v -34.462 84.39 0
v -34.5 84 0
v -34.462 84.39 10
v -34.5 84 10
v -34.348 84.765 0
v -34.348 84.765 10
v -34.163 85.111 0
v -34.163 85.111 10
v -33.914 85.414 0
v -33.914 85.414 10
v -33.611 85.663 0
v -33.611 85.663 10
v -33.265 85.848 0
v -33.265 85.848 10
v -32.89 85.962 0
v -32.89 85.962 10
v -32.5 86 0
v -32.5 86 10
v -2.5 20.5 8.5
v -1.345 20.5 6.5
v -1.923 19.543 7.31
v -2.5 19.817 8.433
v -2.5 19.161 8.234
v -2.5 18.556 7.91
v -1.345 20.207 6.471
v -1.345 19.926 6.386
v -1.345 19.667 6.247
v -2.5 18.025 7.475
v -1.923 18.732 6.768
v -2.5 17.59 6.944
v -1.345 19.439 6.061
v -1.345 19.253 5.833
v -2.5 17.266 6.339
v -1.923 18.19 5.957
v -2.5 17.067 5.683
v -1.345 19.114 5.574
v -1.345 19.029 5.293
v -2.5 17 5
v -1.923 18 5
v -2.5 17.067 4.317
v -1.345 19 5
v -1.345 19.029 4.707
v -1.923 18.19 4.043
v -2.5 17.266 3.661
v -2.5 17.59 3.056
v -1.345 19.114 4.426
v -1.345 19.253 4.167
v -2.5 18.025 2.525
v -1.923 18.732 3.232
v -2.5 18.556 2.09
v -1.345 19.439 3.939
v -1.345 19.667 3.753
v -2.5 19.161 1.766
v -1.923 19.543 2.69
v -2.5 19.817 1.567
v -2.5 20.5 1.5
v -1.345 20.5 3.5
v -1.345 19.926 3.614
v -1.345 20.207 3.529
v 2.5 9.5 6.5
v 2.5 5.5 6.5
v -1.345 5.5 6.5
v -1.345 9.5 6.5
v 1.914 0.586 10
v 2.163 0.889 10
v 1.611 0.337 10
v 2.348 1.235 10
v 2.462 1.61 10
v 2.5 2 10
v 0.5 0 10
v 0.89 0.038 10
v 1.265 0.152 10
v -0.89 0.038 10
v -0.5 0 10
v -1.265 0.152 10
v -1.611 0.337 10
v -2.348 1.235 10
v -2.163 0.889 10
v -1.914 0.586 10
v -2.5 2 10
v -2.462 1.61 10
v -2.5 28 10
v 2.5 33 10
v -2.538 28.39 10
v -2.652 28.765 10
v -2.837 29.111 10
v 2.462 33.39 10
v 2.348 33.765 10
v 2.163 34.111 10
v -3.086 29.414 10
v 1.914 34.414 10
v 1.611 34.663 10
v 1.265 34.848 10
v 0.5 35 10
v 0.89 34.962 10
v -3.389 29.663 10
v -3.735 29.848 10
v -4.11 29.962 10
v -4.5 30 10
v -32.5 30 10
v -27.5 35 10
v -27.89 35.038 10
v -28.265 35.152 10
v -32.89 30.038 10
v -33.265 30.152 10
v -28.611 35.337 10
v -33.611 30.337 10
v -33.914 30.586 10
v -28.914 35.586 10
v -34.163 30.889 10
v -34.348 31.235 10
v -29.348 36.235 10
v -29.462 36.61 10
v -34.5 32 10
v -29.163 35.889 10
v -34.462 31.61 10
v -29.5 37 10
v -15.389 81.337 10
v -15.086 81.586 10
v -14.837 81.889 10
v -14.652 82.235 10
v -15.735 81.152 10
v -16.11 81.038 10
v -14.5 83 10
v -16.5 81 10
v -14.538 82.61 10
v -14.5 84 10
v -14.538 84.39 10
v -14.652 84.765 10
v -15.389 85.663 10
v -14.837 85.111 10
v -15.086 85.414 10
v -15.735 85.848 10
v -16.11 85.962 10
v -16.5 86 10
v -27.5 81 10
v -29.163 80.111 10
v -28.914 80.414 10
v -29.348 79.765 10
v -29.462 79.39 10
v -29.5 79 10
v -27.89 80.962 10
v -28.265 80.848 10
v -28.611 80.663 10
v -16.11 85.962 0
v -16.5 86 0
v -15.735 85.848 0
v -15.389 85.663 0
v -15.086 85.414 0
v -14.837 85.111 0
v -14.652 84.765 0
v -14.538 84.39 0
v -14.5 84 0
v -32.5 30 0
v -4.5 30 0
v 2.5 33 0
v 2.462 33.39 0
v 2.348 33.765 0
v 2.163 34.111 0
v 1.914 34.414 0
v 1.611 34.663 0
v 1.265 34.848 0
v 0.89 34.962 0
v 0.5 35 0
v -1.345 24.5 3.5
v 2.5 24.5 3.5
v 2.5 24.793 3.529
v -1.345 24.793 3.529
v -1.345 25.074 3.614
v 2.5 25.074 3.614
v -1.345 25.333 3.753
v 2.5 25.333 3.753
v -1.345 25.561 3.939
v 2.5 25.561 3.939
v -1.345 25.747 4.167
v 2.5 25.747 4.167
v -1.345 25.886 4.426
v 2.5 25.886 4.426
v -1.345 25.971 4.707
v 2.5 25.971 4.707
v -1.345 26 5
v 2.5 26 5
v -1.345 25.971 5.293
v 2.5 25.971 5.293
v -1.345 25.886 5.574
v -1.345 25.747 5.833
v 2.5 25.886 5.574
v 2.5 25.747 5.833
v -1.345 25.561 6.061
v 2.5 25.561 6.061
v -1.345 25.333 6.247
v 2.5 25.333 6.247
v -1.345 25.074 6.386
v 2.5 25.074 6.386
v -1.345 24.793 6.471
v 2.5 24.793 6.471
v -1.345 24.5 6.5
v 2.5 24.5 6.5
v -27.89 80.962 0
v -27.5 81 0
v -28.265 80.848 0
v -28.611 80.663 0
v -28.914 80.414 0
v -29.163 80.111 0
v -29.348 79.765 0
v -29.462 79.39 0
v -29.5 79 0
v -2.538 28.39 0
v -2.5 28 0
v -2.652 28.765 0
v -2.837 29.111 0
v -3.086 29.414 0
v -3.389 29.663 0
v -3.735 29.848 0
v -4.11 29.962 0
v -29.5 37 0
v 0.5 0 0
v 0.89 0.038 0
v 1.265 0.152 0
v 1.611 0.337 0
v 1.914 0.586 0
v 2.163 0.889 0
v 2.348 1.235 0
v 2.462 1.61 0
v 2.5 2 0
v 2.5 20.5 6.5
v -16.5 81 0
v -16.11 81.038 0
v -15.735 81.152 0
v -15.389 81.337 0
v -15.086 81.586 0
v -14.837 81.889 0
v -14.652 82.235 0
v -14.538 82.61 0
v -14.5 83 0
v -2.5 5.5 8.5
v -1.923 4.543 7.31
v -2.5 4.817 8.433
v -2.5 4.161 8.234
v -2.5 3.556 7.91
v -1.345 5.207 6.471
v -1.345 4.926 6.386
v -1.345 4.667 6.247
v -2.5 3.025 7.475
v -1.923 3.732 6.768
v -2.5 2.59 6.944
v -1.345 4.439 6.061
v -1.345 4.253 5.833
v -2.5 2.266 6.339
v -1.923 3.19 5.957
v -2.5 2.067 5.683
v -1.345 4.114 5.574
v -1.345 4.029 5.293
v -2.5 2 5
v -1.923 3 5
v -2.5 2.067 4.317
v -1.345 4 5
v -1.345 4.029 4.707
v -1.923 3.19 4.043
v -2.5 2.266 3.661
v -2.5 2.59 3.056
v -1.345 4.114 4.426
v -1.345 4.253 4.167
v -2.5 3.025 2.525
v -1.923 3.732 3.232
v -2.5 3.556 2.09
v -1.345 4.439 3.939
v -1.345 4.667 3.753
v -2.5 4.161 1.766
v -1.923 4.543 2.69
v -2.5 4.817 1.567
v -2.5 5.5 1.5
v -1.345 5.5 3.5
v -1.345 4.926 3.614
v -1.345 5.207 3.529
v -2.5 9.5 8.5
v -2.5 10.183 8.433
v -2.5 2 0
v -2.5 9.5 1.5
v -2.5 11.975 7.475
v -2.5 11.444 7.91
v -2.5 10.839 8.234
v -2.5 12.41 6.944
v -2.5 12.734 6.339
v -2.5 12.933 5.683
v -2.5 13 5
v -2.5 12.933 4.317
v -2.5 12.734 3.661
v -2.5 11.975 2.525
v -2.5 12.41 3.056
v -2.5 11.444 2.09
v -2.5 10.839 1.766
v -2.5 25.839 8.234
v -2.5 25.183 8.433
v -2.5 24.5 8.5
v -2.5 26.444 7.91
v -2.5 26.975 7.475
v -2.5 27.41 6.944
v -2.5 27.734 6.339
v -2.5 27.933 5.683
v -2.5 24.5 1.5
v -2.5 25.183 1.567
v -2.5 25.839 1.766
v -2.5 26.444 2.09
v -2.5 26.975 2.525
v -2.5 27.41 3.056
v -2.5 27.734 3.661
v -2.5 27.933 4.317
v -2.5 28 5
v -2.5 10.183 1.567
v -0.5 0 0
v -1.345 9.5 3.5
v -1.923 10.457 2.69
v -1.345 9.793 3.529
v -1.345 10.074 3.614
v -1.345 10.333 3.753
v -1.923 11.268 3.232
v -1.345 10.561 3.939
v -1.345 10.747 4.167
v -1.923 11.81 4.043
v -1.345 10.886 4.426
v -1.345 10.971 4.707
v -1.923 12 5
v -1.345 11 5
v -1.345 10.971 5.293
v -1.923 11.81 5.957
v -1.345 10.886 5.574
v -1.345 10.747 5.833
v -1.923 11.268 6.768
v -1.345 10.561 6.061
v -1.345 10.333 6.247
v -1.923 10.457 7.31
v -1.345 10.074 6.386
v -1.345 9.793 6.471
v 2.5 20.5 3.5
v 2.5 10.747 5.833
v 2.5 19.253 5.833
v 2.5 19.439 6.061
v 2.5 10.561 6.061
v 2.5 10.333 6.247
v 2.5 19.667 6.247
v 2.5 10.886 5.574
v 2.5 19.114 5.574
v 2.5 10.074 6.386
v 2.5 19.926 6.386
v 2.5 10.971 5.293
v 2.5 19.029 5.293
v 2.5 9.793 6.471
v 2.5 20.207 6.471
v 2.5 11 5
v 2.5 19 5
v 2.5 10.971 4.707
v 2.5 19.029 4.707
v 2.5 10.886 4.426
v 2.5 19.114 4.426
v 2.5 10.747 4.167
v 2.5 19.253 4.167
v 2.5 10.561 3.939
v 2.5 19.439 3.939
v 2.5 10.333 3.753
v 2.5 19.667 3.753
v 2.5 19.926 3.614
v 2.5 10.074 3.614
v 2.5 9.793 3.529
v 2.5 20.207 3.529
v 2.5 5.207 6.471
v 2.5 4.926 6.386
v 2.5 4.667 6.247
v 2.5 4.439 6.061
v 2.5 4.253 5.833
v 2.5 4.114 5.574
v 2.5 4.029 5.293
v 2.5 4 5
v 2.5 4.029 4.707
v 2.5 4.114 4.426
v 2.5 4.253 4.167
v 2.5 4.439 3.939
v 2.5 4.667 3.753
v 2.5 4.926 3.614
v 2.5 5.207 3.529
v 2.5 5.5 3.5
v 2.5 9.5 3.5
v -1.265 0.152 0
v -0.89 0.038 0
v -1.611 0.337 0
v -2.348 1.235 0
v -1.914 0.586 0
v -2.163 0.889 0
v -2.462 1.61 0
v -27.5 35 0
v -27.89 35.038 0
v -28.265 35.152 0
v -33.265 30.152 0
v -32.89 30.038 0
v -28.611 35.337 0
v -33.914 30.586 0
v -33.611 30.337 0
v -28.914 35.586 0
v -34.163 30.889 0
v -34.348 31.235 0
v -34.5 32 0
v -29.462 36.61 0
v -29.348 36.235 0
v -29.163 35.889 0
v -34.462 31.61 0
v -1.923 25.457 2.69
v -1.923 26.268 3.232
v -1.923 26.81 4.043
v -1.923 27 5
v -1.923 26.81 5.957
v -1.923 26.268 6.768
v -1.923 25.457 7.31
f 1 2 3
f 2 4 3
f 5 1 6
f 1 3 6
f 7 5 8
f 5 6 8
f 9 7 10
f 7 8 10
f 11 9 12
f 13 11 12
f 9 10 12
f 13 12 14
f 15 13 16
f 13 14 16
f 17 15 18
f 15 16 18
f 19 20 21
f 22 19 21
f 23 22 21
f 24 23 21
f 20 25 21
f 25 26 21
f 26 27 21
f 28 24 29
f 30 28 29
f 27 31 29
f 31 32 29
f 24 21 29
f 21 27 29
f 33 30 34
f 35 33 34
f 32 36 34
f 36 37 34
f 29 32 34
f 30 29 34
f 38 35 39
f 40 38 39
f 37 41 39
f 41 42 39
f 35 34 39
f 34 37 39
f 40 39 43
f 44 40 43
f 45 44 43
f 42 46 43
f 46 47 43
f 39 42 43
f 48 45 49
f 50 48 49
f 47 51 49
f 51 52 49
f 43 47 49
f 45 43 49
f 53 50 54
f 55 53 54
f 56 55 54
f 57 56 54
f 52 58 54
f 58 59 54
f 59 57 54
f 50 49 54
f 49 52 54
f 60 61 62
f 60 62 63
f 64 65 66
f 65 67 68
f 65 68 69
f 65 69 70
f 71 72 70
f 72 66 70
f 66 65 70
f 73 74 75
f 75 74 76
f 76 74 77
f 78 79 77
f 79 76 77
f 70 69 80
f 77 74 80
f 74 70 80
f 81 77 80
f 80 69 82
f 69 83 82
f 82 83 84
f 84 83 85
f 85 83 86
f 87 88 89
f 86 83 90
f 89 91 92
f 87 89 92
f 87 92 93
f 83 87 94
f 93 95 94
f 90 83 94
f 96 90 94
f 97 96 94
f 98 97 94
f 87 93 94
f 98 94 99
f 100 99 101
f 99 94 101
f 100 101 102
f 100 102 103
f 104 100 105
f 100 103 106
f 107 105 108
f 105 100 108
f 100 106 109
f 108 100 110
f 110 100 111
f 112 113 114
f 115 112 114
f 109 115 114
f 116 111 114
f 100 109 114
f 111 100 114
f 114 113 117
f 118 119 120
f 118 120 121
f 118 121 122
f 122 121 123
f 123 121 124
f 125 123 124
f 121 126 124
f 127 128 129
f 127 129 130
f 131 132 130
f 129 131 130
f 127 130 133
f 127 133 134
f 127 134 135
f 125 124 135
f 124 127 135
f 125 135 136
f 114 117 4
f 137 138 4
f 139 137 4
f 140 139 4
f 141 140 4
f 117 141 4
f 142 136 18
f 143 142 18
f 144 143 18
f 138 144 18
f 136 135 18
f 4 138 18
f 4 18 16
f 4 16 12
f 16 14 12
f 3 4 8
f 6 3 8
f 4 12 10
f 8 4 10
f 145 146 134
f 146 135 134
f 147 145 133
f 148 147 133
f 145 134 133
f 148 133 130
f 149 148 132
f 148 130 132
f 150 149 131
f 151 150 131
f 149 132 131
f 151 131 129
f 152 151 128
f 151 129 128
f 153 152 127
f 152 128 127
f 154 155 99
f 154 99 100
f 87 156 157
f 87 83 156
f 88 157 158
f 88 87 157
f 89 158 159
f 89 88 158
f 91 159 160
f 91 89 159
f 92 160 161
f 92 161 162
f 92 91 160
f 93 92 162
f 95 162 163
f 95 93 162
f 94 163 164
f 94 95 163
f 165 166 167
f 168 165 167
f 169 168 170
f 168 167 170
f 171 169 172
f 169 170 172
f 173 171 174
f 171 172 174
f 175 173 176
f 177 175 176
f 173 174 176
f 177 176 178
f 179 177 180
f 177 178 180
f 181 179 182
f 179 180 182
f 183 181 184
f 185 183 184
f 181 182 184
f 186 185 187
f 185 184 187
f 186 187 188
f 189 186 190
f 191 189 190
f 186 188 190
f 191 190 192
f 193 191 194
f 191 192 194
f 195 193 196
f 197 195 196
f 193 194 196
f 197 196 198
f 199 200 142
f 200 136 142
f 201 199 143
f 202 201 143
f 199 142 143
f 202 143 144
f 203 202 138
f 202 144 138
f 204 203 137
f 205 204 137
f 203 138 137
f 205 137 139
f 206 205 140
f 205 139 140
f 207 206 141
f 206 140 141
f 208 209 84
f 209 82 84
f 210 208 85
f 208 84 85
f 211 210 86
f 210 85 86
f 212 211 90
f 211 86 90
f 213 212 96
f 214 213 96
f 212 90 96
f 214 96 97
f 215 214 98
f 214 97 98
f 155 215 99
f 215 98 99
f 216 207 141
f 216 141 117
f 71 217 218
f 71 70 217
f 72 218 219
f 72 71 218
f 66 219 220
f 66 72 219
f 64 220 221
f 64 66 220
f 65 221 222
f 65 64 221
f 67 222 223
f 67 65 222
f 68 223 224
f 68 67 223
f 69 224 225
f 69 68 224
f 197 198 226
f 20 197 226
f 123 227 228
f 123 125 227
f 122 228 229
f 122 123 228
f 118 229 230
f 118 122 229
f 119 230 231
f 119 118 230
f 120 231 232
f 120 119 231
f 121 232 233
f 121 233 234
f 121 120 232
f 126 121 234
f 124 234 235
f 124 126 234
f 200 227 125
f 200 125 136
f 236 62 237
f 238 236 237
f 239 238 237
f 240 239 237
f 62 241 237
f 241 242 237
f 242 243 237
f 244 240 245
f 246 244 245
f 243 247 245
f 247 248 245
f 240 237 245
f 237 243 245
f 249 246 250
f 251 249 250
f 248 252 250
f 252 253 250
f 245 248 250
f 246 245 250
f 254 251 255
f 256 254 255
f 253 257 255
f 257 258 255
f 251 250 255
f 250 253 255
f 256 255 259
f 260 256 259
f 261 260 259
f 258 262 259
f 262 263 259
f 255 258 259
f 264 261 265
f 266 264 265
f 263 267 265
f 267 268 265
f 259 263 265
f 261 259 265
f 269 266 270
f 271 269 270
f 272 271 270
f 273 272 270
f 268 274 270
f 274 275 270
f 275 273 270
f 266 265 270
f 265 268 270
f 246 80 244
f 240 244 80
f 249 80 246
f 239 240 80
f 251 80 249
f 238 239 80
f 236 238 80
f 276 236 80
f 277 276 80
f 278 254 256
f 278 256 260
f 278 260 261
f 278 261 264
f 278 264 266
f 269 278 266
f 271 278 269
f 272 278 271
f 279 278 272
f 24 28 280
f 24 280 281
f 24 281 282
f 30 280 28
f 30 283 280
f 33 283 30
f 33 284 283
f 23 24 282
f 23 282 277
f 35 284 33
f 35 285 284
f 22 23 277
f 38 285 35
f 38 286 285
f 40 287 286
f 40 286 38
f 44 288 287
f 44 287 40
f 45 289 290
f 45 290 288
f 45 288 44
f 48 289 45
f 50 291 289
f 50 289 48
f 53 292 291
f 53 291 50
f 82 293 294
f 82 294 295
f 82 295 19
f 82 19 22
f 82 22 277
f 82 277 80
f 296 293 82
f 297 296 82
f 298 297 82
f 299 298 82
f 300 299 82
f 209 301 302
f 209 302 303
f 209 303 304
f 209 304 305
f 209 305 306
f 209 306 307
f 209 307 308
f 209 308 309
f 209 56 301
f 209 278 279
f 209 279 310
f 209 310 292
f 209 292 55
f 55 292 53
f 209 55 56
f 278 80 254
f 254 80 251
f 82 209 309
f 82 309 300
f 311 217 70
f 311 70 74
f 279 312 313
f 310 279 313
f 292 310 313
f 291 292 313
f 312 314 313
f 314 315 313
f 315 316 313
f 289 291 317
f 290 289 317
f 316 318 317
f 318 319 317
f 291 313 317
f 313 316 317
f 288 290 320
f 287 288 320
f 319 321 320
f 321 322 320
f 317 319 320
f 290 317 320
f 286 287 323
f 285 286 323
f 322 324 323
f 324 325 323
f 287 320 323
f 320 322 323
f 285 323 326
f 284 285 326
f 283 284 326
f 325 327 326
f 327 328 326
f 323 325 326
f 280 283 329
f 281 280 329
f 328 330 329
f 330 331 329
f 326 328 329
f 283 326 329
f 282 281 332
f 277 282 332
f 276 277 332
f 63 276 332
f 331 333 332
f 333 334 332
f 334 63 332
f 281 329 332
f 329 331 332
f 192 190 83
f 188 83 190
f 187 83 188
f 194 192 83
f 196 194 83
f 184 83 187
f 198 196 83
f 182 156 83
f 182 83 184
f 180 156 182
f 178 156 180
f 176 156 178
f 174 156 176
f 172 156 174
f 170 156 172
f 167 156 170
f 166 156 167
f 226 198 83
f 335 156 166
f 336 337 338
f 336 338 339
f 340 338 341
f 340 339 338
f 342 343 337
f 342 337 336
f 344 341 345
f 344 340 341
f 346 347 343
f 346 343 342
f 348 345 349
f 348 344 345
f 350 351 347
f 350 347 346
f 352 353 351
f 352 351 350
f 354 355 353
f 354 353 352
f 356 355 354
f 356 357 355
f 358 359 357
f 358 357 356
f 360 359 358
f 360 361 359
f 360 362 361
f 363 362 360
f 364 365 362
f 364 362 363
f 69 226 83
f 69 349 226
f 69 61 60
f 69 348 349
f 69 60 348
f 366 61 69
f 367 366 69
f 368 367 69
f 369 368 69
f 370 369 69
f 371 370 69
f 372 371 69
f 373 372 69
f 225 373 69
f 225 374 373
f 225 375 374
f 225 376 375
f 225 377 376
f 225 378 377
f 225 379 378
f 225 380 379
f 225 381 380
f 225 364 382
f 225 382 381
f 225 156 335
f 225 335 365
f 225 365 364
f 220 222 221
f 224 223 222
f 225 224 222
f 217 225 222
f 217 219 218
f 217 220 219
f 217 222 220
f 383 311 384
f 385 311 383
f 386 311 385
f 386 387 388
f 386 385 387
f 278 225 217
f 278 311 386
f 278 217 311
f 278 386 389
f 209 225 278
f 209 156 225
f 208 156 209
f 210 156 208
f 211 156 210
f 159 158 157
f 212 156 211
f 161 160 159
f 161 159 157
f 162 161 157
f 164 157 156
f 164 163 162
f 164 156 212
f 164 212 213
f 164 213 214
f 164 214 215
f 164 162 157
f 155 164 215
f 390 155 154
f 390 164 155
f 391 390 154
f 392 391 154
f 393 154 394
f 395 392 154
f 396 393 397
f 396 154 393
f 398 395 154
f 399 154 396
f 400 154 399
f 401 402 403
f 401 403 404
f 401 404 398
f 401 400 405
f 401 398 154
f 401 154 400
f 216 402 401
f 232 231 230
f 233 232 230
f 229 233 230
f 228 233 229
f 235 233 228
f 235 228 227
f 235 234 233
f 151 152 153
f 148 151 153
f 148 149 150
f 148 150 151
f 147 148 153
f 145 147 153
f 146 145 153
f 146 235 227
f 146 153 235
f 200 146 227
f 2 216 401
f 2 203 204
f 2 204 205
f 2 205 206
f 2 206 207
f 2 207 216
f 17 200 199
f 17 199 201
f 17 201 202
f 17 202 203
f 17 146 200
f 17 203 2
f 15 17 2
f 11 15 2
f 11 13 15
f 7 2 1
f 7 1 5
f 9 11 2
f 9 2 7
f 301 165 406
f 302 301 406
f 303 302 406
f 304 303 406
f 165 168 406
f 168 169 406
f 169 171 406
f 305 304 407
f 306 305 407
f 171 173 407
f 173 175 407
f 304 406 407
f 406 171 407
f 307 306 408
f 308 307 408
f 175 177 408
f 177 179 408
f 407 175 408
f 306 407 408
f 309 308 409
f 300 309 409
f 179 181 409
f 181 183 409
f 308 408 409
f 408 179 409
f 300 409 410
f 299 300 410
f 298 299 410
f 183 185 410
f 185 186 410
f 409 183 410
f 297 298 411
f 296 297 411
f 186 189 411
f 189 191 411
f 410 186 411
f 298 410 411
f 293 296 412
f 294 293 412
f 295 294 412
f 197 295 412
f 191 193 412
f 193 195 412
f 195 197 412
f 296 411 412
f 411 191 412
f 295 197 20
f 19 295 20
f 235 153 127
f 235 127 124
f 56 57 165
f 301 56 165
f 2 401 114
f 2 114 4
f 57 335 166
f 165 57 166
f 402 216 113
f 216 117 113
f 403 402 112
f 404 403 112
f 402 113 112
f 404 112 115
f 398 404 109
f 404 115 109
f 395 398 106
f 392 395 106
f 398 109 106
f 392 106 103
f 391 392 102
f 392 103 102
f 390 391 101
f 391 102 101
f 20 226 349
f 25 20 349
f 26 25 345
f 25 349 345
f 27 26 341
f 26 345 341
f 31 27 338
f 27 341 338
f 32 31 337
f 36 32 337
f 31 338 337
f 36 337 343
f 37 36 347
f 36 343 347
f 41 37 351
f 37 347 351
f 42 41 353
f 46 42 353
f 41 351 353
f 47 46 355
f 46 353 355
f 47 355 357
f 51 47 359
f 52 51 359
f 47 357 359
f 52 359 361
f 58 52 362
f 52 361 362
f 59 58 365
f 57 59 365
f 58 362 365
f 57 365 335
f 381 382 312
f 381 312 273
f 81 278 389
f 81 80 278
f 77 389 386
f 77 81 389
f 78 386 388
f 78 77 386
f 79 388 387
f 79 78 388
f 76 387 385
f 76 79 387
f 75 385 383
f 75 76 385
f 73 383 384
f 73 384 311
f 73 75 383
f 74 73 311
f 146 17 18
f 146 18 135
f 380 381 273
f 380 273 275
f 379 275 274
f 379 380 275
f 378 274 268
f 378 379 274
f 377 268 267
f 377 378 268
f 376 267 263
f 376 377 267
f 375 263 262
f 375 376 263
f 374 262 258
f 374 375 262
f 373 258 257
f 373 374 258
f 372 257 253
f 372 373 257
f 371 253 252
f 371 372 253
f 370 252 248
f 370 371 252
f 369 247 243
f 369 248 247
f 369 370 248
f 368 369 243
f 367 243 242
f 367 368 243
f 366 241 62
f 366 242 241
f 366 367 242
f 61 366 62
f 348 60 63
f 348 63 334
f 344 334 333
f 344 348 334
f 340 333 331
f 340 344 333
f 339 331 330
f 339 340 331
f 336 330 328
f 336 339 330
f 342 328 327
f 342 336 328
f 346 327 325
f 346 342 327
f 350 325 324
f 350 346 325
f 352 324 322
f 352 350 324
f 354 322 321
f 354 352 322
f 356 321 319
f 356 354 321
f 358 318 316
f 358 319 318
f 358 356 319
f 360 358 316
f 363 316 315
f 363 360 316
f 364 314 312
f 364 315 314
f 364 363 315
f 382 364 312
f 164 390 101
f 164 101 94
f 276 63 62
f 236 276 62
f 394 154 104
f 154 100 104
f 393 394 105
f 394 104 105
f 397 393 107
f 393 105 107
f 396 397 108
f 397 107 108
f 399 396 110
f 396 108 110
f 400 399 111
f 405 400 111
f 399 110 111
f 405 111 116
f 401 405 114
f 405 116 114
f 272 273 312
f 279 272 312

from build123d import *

# Parameters (mm, degrees)
BOSS_EXTRUDE1_DEPTH     = 10
CUT_EXTRUDE1_DEPTH      = 93.303846074
CUT_EXTRUDE1_DEPTH_BACK = 93.303846074
CHAMFER2_SIZE           = 2
CHAMFER2_SIZE2          = 1.154700538
FILLET1_R               = 2


with BuildPart() as part:
    # Sketch1 → Boss-Extrude1 (new body)
    with BuildSketch(Plane.XY):
        Polygon((-14.5, 81), (-29.5, 81), (-29.5, 35), (2.5, 35), (2.5, 0), (-2.5, 0), (-2.5, 30), (-34.5, 30), (-34.5, 86), (-14.5, 86), align=None)
    extrude(amount=BOSS_EXTRUDE1_DEPTH)

    # Sketch3 → Cut-Extrude1 (cut, two sides: drawn at the far end of the back side and taken through both)
    with BuildSketch(Plane.ZY.offset(2.5).offset(-CUT_EXTRUDE1_DEPTH_BACK)):
        with BuildLine():
            Line((6.5, 24.5), (6.5, 20.5))
            ThreePointArc((6.5, 20.5), (5, 19), (3.5, 20.5))
            Line((3.5, 20.5), (3.5, 24.5))
            ThreePointArc((3.5, 24.5), (5, 26), (6.5, 24.5))
        make_face()
        with BuildLine():
            Line((6.5, 5.5), (6.5, 9.5))
            ThreePointArc((6.5, 9.5), (5, 11), (3.5, 9.5))
            Line((3.5, 9.5), (3.5, 5.5))
            ThreePointArc((3.5, 5.5), (5, 4), (6.5, 5.5))
        make_face()
    extrude(amount=CUT_EXTRUDE1_DEPTH + CUT_EXTRUDE1_DEPTH_BACK, mode=Mode.SUBTRACT)

    # Chamfer2
    chamfer2_edges = [part.edges().sort_by_distance(p)[0] for p in [
        (-2.5, 26, 5),
        (-2.5, 22.5, 6.5),
        (-2.5, 19, 5),
        (-2.5, 22.5, 3.5),
        (-2.5, 4, 5),
        (-2.5, 7.5, 3.5),
        (-2.5, 11, 5),
        (-2.5, 7.5, 6.5),
    ]]
    chamfer2_side = [part.faces().sort_by_distance(p)[0] for p in [
        (-2.5, 15, 5),
    ]]
    chamfer(chamfer2_edges, length=CHAMFER2_SIZE, length2=CHAMFER2_SIZE2, reference=chamfer2_side[0])

    # Fillet1
    fillet1_edges = [part.edges().sort_by_distance(p)[0] for p in [
        (-29.5, 81, 5),
        (-29.5, 35, 5),
        (2.5, 35, 5),
        (2.5, 0, 5),
        (-2.5, 0, 5),
        (-2.5, 30, 5),
        (-34.5, 30, 5),
        (-34.5, 86, 5),
        (-14.5, 86, 5),
        (-14.5, 81, 5),
    ]]
    fillet(fillet1_edges, radius=FILLET1_R - 0.0001)  # a hair under: the kernel refuses the full size


solid = part.part
